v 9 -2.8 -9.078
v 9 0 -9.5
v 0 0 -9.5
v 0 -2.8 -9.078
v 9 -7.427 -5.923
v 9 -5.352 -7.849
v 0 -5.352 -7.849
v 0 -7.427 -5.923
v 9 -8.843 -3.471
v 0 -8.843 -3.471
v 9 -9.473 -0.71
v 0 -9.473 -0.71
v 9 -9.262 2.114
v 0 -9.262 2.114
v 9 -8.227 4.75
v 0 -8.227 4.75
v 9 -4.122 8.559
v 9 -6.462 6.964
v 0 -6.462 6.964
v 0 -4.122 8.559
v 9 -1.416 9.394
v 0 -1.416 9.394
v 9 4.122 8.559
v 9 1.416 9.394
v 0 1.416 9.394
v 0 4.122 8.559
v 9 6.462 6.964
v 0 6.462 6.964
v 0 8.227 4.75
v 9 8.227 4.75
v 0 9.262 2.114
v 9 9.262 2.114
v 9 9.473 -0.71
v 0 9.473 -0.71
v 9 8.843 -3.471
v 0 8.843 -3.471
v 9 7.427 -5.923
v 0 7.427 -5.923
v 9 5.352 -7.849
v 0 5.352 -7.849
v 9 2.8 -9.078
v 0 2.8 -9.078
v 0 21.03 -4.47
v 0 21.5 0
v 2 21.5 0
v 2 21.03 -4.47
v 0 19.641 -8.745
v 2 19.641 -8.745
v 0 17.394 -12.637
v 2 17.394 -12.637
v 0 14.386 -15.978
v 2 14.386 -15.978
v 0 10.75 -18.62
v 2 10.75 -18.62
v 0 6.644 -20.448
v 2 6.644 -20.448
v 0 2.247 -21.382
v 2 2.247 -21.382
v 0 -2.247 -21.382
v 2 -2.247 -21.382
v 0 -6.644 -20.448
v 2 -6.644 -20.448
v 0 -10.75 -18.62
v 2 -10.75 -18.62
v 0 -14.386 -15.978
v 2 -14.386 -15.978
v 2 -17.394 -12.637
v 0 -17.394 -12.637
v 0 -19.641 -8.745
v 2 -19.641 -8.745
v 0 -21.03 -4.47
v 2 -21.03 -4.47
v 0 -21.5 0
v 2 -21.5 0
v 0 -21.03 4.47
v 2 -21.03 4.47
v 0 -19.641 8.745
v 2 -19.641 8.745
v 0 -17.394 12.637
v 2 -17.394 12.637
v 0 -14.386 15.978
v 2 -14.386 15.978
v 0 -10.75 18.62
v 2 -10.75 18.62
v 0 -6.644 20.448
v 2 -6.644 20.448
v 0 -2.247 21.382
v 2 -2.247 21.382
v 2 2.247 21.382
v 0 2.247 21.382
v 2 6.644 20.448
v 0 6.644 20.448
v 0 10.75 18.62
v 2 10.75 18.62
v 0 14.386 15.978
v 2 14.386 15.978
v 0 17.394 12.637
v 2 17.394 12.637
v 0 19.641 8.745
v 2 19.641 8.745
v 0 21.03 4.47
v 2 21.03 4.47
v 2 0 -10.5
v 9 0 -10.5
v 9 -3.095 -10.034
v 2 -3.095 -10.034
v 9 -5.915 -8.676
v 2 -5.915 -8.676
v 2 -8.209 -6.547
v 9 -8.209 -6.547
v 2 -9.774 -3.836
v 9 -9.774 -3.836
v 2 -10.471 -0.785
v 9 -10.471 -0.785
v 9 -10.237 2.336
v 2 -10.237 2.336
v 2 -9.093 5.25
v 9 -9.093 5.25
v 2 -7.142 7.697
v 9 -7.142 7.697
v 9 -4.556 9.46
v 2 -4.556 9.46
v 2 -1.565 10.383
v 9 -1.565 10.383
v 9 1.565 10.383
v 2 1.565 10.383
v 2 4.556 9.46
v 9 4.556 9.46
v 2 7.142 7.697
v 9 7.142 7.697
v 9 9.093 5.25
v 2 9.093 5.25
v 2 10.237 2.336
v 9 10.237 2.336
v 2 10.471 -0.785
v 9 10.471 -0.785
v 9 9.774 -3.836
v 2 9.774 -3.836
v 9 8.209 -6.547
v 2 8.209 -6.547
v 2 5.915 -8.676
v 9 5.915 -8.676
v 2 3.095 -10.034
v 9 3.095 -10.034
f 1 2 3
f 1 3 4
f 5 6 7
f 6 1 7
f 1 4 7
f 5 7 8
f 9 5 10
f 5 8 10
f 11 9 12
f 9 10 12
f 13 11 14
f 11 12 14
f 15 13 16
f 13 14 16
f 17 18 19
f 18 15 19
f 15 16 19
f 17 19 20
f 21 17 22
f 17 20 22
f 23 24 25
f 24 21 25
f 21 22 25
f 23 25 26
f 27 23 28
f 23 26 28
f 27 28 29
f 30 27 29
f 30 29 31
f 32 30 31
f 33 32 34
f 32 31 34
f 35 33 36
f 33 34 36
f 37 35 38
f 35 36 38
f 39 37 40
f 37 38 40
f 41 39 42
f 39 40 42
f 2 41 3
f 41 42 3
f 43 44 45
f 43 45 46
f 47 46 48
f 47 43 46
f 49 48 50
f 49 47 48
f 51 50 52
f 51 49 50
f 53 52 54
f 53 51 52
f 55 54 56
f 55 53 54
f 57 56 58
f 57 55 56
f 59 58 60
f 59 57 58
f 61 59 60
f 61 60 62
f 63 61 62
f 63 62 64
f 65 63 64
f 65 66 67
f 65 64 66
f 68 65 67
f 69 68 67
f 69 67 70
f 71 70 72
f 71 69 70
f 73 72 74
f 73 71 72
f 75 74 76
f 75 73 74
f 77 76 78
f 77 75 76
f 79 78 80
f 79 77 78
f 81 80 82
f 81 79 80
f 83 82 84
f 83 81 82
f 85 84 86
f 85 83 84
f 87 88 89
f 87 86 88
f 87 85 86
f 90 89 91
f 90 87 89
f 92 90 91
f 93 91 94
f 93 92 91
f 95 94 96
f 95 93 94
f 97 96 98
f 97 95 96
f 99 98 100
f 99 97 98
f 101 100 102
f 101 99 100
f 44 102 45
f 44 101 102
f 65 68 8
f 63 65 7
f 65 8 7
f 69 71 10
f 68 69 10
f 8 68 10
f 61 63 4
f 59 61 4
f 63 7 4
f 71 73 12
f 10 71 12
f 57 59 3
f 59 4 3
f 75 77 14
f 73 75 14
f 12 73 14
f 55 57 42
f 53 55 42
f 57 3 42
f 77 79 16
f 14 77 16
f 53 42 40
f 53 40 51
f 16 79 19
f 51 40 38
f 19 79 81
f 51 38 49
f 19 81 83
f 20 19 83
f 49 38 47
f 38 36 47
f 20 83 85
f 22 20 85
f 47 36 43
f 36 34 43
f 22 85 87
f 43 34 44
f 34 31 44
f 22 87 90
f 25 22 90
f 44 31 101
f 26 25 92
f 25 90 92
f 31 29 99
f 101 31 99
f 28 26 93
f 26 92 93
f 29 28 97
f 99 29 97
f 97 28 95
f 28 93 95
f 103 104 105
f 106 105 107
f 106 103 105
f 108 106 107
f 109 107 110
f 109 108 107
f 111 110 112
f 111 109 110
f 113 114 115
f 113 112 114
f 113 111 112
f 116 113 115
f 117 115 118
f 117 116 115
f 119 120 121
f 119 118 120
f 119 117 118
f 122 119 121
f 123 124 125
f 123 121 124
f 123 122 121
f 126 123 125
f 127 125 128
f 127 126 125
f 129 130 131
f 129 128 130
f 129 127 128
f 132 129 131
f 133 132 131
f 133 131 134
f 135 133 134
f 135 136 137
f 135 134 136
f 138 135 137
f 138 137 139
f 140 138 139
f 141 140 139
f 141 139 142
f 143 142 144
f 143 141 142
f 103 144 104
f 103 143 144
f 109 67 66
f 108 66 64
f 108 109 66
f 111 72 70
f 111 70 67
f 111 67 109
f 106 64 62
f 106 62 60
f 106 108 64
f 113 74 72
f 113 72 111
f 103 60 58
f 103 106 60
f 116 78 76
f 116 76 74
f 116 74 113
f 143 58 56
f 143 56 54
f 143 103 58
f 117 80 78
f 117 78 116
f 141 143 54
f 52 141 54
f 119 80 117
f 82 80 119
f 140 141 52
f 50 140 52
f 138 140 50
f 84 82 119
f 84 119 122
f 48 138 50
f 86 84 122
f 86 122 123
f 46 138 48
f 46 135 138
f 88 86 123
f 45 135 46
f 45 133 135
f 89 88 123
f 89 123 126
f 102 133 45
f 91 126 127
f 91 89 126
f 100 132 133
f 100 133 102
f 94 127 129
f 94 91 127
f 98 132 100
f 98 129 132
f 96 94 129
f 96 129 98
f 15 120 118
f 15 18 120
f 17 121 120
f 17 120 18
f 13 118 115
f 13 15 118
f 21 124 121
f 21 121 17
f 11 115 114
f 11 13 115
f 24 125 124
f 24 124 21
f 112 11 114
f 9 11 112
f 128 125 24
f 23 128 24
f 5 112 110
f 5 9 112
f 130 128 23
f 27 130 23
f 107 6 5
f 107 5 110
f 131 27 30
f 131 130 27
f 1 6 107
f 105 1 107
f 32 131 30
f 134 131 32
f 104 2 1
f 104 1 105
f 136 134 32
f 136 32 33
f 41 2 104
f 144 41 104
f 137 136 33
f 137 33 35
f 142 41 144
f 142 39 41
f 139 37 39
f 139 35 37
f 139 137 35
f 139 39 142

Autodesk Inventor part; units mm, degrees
ref_plane "YZ Plane" through (0, 0, 0) normal (1, 0, 0) x (0, 1, 0)
ref_plane "XZ Plane" through (0, 0, 0) normal (0, 1, 0) x (-1, 0, 0)
ref_plane "XY Plane" through (0, 0, 0) normal (0, 0, 1) x (1, 0, 0)
sketch "Sketch2" plane through (0, 0, 0) normal (1, 0, 0) x (0, 1, 0)
  circle A0 centre (0, 0) radius 21.5
  dimension "d3" = 43
extrude "Extrusion1" add sketch "Sketch2" along normal blind 2
sketch "Sketch3" plane through (2, 0, 0) normal (1, 0, 0) x (0, 0, -1)
  circle A0 centre (0, 0) radius 21.5 projected
  circle A1 centre (0, 0) radius 9.5
  dimension "d6" = 19
extrude "Extrusion2" cut sketch "Sketch3" against normal blind 2 contours A1
sketch "Sketch4" plane through (2, 0, 0) normal (1, 0, 0) x (0, 0, -1)
  circle A0 centre (0, 0) radius 9.5 projected
  circle A1 centre (0, 0) radius 21.5 projected
  circle A2 centre (0, 0) radius 10.5
  dimension "d9" = 21
extrude "Extrusion3" add sketch "Sketch4" along normal blind 7 contours A2
properties part number "holeCover"
